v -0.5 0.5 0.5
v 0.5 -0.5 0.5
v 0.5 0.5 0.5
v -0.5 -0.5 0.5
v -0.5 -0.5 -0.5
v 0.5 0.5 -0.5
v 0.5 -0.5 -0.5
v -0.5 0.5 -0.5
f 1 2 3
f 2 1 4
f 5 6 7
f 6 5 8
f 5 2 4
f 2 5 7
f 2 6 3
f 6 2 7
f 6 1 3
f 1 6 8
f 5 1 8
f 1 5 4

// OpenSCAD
module ear()
{
  we = dxf_dim(file="futaba-ears.dxf", name="we");
  rd = dxf_dim(file="futaba-ears.dxf", name="rd");
  xd = dxf_dim(file="futaba-ears.dxf", name="xd");
  yd = dxf_dim(file="futaba-ears.dxf", name="yd");
  we2= dxf_dim(file="futaba-ears2.dxf", name="we2");

  difference() {
    union() {
      linear_extrude(height=we)
       import(file="futaba-ears.dxf", layer="exterior");

      translate([0,we2/2,we])
      rotate(a=90, v=[1,0,0])
      linear_extrude(height=we2)
        import(file="futaba-ears2.dxf", layer="exterior");
    }

    translate([-xd,yd,0])
      cylinder(r=rd, h=we+10, $fn=16,center=true);
    translate([-xd,-yd,0])
      cylinder(r=rd, h=we+10, $fn=16,center=true);
  }
}

module futaba() 
{
  z1 = dxf_dim(file="futaba-main.dxf", name="z1");
  x1 = dxf_dim(file="futaba-main.dxf", name="x1");
  y1 = dxf_dim(file="futaba-main.dxf", name="y1");
  ht  = dxf_dim(file="futaba-top.dxf", name="ht");
  xs = dxf_dim(file="futaba-main.dxf",name="xs");
  he = dxf_dim(file="futaba-main.dxf",name="he");



  union() {
    //-- Main part
    translate([0,0,z1/2])
    cube(size=[x1,y1,z1], center=true);

    //-- Top part
    translate([0,0,z1])
    rotate (a=90, v=[1,0,0])
    linear_extrude(height=y1,center=true)
       import(file="futaba-top.dxf");

   //-- Shaft part
   translate ([xs,0,z1+ht]) 
     rotate_extrude()
       import(file="Futaba-shaft.dxf");
      
  }

  translate([-x1/2,0,he]) ear();
  translate([x1/2,0,he]) 
    rotate(a=180, v=[0,0,1]) ear();

}


futaba();
